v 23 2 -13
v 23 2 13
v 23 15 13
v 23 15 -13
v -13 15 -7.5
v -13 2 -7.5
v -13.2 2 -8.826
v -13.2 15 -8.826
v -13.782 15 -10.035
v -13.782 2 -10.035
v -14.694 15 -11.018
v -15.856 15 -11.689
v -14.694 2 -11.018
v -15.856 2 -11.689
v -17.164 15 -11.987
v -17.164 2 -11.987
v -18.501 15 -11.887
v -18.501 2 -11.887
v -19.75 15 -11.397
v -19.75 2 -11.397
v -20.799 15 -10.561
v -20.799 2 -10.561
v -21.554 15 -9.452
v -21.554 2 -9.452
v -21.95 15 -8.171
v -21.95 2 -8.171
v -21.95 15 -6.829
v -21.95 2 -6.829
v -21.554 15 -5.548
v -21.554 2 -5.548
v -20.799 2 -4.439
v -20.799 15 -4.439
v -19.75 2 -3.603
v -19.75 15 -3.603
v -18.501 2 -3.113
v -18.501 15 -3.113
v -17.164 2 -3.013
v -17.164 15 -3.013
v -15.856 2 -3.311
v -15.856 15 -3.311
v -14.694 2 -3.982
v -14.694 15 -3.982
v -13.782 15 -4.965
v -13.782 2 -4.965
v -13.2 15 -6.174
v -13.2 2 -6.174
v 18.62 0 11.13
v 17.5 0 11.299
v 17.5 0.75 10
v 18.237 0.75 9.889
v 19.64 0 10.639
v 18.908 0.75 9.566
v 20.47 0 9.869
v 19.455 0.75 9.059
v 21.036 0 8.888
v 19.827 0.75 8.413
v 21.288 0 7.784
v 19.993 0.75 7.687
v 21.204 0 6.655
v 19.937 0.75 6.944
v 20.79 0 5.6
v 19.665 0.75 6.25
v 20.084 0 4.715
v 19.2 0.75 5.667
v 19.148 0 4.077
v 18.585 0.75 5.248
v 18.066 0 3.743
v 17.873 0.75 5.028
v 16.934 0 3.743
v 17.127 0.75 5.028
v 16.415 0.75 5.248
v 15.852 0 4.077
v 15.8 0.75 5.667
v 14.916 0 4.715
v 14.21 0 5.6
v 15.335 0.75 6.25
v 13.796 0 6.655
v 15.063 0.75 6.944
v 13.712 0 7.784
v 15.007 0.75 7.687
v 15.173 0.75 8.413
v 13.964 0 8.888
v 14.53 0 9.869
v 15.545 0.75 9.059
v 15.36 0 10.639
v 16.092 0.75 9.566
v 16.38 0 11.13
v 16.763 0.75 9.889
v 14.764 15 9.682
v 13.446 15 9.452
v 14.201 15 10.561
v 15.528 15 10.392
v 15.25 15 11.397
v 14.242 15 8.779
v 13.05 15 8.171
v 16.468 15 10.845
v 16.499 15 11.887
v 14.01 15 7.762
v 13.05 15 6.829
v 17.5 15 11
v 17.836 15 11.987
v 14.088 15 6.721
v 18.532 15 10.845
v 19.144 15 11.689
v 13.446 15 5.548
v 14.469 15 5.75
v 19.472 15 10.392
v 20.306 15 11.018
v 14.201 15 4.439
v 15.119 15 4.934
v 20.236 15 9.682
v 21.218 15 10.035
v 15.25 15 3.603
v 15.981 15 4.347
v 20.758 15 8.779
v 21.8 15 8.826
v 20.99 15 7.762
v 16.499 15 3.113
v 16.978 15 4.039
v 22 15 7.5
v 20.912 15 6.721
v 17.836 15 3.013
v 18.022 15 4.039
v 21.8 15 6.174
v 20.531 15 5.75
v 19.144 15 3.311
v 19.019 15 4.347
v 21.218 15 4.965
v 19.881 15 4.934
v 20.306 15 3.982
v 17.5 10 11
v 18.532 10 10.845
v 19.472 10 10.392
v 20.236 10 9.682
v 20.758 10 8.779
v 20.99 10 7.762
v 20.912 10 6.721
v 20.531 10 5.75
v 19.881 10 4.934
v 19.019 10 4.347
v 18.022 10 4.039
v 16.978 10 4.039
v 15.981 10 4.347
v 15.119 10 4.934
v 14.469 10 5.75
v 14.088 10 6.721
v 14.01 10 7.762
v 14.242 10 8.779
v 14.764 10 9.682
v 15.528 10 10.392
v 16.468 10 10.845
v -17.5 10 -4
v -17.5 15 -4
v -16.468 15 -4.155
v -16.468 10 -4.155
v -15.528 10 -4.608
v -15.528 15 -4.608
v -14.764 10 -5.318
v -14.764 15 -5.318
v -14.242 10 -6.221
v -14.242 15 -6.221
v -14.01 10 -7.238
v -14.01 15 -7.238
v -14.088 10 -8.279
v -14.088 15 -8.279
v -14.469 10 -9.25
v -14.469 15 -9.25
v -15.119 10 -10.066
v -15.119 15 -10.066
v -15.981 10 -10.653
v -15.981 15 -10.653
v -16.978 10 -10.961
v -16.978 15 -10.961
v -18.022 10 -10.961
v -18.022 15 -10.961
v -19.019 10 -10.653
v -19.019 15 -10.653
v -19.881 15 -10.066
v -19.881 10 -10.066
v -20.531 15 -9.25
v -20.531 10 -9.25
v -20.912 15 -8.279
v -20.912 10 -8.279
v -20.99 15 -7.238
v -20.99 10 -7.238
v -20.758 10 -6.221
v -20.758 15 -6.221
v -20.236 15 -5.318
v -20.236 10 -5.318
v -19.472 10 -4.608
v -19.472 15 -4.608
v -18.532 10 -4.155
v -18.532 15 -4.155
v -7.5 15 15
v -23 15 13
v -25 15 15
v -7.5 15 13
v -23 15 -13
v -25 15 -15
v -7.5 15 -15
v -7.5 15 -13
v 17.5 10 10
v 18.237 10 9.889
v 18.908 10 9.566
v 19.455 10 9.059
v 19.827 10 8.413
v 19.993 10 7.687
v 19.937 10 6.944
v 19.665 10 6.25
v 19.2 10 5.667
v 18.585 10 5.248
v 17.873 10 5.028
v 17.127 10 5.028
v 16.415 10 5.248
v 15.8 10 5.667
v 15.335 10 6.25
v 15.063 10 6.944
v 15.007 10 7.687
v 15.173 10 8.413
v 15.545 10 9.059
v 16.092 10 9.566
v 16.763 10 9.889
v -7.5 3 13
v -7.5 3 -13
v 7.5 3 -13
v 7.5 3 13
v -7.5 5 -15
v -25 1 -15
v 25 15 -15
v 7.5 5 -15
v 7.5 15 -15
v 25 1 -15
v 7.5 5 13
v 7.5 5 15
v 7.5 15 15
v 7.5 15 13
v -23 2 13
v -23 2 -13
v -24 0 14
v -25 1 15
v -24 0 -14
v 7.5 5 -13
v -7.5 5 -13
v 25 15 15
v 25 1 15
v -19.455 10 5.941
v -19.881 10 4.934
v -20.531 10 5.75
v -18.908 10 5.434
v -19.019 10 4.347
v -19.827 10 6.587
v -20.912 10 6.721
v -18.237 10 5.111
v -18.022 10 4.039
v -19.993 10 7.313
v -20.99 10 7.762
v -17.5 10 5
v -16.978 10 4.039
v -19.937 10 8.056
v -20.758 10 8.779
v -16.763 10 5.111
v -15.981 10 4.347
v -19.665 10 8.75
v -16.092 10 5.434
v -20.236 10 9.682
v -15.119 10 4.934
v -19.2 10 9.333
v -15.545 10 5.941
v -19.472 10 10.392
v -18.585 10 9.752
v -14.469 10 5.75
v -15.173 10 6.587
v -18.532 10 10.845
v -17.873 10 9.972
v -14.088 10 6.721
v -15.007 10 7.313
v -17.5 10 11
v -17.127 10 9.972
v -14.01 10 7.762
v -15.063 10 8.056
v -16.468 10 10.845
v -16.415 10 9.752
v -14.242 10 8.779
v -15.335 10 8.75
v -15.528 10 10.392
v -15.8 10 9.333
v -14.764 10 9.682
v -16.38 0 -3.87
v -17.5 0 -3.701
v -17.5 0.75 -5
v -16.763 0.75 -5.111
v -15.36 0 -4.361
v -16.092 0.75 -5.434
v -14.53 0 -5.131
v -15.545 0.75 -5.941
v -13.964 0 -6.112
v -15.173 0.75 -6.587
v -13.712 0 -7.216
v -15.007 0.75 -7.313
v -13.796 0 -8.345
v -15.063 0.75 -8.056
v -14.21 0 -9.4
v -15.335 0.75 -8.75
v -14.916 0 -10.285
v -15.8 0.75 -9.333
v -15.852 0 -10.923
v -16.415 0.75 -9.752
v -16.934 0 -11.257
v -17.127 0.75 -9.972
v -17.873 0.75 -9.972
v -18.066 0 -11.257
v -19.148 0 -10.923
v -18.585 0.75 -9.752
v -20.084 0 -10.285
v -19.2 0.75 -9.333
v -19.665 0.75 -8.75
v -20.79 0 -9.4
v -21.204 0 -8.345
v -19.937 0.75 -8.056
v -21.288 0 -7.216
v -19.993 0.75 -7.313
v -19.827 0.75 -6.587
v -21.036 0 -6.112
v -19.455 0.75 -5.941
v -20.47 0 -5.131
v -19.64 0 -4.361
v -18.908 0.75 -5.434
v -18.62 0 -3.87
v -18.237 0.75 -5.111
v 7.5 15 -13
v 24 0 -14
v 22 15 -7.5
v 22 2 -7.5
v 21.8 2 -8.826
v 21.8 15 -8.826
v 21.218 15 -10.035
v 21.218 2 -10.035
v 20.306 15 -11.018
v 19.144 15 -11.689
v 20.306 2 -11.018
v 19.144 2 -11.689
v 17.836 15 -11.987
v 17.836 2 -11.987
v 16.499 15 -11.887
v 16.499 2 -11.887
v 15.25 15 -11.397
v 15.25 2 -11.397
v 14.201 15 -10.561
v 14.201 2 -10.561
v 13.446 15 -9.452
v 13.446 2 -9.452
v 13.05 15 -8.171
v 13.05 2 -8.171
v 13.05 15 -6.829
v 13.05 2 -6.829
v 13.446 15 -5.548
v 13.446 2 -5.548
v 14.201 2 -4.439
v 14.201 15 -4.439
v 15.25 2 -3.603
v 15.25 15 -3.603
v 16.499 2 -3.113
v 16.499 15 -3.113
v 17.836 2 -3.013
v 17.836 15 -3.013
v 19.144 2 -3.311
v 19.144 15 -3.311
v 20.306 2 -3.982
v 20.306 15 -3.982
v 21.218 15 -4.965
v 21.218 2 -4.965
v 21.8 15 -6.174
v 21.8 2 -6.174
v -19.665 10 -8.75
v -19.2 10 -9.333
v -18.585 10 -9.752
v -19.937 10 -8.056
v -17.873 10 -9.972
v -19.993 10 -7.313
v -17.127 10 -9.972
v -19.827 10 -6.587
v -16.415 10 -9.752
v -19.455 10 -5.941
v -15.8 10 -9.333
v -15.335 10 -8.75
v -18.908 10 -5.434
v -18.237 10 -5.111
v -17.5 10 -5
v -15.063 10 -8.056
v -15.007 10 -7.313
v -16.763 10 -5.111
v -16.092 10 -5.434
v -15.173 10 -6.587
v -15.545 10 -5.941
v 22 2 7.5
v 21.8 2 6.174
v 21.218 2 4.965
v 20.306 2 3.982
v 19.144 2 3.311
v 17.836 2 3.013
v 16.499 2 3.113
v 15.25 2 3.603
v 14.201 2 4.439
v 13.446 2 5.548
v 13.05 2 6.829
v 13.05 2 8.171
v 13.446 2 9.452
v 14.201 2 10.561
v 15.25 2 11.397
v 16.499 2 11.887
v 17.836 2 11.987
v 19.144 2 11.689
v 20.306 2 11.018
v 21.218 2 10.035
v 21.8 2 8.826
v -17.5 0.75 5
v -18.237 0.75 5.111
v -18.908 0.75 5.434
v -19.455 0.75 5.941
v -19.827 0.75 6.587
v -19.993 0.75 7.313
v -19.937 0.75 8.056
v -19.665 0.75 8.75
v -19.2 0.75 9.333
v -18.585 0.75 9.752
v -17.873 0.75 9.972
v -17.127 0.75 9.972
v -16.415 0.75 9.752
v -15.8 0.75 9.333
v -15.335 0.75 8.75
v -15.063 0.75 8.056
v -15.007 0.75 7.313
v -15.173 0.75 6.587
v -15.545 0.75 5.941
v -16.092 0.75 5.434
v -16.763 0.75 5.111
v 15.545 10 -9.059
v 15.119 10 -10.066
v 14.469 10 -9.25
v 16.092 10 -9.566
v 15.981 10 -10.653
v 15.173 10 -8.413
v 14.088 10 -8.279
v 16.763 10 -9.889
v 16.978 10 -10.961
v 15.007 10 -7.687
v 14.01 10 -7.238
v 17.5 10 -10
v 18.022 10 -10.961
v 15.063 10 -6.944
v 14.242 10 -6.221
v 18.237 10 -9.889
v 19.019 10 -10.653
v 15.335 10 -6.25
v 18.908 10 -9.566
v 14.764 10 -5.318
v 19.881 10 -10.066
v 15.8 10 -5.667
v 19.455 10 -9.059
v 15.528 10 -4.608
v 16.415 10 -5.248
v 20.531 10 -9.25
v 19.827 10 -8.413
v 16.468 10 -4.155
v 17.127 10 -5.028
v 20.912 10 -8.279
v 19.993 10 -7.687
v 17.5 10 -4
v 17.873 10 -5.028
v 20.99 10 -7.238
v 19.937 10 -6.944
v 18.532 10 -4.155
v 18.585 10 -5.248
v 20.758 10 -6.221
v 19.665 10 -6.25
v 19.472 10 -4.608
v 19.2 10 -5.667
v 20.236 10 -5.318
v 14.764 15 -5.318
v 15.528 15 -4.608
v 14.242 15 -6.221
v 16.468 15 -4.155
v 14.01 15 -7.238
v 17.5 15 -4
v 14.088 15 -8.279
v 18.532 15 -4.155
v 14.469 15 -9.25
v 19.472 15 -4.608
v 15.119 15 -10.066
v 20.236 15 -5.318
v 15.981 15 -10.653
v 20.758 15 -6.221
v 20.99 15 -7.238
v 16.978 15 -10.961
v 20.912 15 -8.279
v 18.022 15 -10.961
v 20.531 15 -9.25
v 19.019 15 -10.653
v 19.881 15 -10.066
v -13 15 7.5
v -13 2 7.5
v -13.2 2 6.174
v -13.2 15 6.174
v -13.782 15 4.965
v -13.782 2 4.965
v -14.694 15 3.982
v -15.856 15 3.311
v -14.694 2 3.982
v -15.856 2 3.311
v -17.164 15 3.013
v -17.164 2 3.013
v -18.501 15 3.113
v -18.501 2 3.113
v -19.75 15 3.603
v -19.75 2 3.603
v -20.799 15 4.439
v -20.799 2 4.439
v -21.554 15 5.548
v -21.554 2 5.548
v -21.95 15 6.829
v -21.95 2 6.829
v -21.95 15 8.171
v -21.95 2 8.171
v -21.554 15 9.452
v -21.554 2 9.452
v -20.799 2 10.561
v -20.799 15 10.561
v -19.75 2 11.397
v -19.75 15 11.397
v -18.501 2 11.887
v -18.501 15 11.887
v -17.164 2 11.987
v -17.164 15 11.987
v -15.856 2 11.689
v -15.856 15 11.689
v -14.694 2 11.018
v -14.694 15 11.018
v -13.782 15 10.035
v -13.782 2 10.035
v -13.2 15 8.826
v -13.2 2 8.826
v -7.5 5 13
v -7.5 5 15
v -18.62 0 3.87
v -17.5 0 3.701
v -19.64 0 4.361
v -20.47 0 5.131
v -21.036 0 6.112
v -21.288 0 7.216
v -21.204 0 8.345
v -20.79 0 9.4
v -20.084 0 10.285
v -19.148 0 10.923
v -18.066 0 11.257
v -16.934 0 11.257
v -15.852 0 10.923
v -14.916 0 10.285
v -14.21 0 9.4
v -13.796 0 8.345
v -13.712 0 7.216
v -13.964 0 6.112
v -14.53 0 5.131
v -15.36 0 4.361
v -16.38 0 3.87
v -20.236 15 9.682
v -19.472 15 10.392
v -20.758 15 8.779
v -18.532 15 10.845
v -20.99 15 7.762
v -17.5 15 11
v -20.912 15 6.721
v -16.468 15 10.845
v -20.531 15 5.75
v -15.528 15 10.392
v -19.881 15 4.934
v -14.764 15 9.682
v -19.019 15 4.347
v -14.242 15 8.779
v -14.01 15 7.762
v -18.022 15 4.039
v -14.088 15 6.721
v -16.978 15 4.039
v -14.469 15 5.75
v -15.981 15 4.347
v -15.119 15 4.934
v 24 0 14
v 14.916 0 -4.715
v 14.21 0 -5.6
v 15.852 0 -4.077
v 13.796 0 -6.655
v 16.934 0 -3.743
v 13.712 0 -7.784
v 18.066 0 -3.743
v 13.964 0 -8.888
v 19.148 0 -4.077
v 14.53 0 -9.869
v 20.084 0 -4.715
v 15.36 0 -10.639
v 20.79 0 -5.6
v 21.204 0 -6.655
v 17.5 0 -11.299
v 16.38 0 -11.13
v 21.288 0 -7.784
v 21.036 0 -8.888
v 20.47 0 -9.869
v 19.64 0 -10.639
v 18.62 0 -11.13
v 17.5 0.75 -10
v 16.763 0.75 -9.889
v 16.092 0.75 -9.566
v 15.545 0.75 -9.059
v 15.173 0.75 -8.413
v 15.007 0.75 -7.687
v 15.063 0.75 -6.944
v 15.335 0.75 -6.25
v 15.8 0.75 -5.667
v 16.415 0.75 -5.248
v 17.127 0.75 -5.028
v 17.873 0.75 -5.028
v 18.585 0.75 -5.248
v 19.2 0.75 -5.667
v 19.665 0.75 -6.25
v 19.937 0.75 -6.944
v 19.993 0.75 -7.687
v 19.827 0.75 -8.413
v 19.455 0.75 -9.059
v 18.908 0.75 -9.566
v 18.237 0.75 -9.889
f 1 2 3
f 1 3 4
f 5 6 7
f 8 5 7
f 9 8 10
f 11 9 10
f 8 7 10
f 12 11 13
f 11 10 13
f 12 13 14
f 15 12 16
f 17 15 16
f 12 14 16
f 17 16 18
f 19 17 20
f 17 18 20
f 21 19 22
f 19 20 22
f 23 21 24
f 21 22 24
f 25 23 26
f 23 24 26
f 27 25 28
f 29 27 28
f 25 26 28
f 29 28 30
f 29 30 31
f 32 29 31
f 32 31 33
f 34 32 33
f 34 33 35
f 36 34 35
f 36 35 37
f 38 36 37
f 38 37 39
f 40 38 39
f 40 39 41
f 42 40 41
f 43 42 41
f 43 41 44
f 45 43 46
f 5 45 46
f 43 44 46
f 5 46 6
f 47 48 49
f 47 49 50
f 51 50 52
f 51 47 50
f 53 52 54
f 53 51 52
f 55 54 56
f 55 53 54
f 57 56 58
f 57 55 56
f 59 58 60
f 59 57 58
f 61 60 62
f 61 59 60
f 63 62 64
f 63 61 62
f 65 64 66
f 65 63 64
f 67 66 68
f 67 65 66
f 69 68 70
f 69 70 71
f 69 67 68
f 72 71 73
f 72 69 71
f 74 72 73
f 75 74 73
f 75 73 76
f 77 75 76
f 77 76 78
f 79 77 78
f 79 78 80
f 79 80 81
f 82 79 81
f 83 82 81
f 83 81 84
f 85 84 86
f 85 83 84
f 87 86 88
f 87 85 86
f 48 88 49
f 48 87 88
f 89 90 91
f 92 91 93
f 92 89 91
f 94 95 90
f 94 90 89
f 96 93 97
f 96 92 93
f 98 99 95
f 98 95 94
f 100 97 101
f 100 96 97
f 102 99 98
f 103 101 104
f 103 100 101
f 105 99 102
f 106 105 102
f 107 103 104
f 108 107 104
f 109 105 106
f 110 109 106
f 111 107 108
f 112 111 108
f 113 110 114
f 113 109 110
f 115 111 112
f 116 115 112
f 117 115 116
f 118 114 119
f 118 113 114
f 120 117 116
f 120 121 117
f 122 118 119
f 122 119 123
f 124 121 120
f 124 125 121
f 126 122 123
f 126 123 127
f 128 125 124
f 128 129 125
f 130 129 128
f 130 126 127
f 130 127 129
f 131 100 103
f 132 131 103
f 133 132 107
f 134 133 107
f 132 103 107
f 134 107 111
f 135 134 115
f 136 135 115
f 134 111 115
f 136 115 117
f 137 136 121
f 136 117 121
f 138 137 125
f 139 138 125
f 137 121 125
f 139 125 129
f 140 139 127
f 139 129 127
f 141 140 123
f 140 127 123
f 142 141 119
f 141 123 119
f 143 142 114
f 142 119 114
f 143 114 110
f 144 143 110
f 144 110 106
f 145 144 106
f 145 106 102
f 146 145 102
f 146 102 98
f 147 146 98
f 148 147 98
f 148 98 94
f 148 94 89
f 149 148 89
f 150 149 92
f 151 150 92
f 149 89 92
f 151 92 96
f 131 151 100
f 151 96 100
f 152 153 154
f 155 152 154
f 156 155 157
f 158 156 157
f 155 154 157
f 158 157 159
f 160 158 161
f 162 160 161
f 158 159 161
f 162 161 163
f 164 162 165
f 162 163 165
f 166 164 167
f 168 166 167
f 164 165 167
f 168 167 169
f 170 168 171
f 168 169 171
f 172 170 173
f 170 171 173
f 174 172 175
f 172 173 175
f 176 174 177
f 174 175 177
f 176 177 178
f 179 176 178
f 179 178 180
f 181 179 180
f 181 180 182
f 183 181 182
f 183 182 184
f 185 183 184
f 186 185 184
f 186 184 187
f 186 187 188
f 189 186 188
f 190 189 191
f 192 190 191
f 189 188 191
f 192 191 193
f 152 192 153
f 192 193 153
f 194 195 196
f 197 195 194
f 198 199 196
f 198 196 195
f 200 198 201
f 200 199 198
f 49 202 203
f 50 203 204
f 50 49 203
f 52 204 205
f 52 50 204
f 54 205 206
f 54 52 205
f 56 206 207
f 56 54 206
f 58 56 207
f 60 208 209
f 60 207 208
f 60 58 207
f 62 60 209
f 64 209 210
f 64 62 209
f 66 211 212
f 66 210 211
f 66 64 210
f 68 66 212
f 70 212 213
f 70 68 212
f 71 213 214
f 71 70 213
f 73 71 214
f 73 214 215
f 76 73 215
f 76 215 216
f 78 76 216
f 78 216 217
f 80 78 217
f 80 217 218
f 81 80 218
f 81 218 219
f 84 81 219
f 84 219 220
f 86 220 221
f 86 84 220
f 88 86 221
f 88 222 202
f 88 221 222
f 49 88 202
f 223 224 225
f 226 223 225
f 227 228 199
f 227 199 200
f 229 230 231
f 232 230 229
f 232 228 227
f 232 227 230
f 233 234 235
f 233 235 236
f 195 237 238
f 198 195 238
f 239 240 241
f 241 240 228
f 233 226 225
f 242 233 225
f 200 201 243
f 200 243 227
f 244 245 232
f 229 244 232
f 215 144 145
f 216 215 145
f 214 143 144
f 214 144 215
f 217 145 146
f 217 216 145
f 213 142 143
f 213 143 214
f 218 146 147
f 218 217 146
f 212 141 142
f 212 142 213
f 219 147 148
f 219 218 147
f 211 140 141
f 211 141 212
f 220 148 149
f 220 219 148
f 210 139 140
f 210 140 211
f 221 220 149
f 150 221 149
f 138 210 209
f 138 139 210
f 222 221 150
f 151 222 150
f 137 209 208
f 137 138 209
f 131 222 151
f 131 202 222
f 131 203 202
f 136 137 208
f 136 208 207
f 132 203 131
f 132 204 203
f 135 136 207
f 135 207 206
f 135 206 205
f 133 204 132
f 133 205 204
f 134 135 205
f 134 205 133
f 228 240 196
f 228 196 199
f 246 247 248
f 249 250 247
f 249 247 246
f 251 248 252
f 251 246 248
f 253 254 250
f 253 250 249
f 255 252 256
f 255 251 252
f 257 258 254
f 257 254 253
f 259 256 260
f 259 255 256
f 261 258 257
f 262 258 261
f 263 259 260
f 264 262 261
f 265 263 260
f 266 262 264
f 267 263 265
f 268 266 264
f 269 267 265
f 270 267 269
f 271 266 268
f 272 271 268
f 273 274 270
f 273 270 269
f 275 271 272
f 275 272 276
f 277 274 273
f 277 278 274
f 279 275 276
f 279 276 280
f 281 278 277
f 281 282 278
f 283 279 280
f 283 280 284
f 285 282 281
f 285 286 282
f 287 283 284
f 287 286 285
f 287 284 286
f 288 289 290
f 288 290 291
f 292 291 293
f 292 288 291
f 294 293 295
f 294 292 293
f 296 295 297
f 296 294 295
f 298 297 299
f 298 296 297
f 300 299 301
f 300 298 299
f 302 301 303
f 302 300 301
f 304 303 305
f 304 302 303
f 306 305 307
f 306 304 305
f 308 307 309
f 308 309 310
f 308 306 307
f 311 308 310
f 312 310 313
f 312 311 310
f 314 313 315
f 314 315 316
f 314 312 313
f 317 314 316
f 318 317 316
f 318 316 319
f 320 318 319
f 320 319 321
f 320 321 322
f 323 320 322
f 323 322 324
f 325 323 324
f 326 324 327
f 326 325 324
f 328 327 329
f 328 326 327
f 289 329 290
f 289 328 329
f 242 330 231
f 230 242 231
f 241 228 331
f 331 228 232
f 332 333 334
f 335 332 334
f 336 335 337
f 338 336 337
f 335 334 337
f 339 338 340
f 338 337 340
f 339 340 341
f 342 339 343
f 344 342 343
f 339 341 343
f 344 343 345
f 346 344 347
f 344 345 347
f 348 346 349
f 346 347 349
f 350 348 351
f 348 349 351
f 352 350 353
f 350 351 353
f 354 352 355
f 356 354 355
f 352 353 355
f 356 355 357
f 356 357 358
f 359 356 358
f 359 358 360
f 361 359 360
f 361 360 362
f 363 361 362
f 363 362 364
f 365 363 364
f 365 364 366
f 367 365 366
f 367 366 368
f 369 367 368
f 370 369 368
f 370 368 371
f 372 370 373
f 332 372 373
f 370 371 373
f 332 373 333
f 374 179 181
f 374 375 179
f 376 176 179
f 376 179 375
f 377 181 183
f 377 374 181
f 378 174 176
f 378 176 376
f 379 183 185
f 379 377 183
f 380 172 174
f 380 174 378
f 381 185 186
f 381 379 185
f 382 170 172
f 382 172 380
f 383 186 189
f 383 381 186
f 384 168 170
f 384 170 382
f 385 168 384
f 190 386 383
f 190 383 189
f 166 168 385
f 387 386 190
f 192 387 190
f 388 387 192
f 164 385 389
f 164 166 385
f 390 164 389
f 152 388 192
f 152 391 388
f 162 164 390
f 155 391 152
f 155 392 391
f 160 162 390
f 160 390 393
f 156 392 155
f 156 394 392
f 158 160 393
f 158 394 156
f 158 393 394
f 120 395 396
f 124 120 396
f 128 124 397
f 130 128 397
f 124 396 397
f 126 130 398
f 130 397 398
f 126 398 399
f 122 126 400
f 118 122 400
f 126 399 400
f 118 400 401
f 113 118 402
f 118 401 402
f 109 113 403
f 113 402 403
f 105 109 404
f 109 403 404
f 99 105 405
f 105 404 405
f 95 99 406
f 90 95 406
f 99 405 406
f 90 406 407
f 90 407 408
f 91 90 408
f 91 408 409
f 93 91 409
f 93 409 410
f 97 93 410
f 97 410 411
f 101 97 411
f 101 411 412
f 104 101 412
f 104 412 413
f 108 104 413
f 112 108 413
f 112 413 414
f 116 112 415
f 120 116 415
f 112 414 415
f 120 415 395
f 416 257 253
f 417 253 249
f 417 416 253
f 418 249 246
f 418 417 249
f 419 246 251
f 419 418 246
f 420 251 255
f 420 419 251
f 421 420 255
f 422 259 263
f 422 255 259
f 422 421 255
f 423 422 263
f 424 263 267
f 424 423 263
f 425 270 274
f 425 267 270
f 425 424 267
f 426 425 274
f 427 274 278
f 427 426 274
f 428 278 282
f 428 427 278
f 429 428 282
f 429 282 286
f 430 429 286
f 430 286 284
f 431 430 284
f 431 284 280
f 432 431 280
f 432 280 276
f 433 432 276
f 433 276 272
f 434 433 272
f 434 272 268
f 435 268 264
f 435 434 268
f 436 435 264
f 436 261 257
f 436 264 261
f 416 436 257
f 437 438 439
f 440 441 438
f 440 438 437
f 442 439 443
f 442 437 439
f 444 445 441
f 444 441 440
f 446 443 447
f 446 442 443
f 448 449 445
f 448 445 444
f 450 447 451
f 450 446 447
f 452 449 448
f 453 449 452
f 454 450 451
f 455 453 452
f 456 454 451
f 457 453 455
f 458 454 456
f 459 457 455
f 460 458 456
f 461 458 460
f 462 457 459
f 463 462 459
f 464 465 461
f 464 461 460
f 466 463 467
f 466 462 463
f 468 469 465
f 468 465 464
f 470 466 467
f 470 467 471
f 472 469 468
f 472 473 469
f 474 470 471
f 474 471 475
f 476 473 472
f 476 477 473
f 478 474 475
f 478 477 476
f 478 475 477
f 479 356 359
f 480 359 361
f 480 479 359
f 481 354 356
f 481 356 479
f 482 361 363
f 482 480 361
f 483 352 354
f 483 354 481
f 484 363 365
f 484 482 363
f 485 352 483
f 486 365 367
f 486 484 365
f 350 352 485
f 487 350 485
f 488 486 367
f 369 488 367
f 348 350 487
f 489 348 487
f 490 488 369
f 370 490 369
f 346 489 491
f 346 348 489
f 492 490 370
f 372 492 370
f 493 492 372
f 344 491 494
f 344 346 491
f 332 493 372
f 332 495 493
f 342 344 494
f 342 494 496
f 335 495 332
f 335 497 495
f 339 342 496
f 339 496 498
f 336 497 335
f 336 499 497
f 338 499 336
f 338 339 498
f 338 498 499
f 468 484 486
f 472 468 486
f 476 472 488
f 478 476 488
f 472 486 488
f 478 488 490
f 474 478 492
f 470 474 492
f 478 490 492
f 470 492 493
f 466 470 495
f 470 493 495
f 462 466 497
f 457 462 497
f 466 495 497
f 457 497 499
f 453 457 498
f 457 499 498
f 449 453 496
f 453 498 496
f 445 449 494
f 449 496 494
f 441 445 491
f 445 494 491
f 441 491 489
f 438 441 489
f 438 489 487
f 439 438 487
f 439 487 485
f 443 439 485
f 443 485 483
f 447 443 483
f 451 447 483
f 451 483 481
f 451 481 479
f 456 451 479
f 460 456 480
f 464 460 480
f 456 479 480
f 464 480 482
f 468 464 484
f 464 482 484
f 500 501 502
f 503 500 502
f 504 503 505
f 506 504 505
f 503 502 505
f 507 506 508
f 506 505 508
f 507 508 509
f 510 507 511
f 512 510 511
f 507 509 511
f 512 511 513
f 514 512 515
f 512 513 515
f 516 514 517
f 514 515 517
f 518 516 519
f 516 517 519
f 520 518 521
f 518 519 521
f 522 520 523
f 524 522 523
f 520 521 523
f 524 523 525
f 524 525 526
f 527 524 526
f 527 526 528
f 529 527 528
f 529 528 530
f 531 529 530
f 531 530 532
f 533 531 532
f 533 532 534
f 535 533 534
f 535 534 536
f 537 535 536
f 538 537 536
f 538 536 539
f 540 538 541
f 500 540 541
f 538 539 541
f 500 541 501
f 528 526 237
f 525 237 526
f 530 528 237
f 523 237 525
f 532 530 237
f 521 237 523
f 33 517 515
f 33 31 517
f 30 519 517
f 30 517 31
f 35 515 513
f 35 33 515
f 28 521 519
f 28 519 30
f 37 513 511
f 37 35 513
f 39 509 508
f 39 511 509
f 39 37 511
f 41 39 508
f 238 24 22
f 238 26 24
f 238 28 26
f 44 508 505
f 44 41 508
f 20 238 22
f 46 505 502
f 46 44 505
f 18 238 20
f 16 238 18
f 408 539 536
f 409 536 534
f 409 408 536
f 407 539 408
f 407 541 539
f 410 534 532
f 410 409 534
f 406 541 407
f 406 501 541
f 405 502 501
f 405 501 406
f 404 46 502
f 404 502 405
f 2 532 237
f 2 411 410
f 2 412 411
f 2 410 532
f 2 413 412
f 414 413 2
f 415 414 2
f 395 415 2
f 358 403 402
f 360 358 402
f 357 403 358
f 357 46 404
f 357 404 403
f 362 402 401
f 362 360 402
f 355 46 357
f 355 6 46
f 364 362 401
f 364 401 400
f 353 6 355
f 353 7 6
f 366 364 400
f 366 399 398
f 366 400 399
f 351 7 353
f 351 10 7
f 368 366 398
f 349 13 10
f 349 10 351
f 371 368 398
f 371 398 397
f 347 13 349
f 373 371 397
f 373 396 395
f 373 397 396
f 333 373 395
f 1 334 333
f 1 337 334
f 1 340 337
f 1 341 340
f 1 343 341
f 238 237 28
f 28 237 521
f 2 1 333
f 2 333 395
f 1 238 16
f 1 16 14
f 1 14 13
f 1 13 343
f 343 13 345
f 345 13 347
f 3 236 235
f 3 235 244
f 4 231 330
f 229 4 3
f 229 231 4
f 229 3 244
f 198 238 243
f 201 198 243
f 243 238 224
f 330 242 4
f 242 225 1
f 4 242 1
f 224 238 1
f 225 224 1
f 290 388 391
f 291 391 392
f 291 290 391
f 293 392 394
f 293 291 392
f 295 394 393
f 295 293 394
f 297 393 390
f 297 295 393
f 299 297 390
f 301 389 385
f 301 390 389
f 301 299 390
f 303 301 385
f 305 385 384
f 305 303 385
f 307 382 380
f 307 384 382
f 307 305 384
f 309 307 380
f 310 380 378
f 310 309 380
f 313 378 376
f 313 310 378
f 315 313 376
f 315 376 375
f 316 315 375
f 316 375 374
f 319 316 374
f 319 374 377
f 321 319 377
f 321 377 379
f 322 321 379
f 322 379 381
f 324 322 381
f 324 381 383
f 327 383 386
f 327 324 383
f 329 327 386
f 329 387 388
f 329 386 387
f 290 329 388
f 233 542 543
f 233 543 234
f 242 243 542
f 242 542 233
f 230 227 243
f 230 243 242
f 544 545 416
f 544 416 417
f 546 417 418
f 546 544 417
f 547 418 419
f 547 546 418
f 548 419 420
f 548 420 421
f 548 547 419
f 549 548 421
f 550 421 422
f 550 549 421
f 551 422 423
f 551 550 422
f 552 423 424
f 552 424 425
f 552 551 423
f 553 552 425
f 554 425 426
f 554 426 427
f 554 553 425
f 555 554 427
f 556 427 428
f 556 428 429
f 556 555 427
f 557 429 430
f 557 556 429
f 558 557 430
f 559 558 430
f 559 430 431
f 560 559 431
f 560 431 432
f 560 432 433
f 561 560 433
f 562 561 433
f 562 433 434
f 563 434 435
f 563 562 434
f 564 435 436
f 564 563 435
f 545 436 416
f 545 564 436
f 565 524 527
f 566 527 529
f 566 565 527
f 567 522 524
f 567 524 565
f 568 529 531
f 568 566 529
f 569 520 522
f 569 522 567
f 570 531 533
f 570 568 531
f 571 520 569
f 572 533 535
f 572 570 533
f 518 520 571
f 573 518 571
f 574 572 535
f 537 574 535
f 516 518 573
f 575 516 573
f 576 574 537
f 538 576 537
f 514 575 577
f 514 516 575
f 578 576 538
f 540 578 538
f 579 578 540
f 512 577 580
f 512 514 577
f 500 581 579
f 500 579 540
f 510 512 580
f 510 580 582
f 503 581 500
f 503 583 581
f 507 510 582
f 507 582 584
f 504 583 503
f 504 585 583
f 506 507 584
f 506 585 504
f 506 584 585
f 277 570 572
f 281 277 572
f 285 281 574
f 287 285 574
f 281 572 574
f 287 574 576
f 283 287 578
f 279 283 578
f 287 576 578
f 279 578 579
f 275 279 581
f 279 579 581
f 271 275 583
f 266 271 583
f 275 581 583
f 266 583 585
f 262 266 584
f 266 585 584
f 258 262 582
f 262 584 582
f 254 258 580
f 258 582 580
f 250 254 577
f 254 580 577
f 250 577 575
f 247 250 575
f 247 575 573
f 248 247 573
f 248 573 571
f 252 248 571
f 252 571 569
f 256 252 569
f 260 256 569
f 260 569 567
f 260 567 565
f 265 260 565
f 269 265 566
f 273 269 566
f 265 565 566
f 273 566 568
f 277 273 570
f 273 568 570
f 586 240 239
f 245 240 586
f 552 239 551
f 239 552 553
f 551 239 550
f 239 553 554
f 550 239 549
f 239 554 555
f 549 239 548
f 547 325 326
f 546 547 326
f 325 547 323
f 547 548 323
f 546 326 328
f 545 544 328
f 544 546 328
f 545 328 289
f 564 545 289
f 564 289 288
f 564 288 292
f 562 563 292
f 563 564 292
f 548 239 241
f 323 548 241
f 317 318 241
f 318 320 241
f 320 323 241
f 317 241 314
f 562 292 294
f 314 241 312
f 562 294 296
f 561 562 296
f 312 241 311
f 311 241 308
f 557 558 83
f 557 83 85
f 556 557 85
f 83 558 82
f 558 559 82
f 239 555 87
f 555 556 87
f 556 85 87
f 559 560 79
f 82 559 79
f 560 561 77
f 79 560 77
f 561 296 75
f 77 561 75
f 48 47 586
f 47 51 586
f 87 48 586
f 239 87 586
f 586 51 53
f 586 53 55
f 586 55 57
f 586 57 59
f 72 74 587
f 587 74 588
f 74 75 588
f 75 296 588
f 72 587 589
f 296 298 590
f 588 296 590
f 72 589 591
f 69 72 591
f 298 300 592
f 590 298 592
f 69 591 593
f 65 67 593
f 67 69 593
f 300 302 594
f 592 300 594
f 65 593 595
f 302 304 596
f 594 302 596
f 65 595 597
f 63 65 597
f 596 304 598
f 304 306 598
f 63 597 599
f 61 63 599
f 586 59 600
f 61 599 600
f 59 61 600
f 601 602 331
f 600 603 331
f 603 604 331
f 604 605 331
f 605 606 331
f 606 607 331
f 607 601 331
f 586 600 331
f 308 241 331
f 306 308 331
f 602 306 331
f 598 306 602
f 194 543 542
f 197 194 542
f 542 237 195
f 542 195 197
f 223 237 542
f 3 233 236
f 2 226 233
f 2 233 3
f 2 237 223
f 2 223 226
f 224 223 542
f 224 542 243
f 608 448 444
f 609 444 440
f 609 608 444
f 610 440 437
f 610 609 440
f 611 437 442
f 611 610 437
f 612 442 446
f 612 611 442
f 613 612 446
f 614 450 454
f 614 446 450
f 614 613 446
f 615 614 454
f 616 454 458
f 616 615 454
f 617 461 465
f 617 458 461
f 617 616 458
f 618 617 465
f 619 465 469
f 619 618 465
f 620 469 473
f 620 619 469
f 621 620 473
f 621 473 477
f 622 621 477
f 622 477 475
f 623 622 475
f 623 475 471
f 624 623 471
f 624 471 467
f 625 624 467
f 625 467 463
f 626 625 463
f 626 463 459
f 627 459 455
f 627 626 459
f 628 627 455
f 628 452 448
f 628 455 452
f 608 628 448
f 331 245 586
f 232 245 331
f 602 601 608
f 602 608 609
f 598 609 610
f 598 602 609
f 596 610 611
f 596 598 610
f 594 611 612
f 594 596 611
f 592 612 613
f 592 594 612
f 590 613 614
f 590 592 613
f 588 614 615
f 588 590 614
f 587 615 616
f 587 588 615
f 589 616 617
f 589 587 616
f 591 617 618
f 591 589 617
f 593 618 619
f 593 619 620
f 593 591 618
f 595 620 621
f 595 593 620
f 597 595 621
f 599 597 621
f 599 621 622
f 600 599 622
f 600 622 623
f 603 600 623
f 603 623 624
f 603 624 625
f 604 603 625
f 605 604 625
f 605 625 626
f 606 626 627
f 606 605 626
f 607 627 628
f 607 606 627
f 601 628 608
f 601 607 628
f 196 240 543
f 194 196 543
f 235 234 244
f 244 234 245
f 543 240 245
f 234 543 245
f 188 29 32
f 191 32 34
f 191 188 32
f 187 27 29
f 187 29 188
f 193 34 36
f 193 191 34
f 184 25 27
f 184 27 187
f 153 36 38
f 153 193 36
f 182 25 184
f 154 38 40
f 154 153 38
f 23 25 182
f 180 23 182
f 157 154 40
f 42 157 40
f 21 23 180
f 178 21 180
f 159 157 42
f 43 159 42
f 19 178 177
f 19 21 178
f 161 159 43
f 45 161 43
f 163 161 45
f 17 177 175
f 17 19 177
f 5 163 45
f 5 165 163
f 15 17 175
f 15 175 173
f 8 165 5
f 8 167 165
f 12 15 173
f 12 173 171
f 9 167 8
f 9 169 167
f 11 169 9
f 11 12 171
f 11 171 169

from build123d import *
from OCP.BRepFilletAPI import BRepFilletAPI_MakeChamfer

# Parameters (mm, degrees)
SKETCH1_W           = 50
SKETCH1_H           = 30
SKETCH1_R           = 2.5
BOSS_EXTRUDE1_DEPTH = 15
SKETCH2_W           = 15
SKETCH2_H           = 30
CUT_EXTRUDE1_DEPTH  = 10
CHAMFER1_SIZE       = 0.75
CHAMFER1_SIZE2      = 1.299038106
SHELL1_START        = 2
SHELL1_OUTLINE_W    = 15.5
SHELL1_OUTLINE_H    = 26
SHELL1_OUTLINE_R    = 4.5
SHELL1_DEPTH        = 13
SHELL1_2_OUTLINE_W  = 15
SHELL1_2_OUTLINE_H  = 26
SHELL1_2_DEPTH      = 1
SKETCH3_R           = 3.5
CUT_EXTRUDE2_DEPTH  = 5
SKETCH4_R           = 3.5
CUT_EXTRUDE3_DEPTH  = 5
SKETCH5_R           = 3.5
CUT_EXTRUDE4_DEPTH  = 5
SKETCH6_R           = 3.5
CUT_EXTRUDE5_DEPTH  = 5
CHAMFER2_SIZE       = 1


# Read off the part's stored shape, not the designer's step: Shell1
with BuildPart() as part:
    # Sketch1 → Boss-Extrude1 (new body)
    with BuildSketch(Plane(origin=(0, 0, 0), x_dir=(1, 0, 0), z_dir=(0, 1, 0))):
        Rectangle(SKETCH1_W, SKETCH1_H)
        with Locations(Location((-17.5, 7.5, 0), (0, 0, 270))):
            Circle(SKETCH1_R, mode=Mode.SUBTRACT)
        with Locations(Location((17.5, 7.5, 0), (0, 0, 90))):
            Circle(SKETCH1_R, mode=Mode.SUBTRACT)
        with Locations(Location((17.5, -7.5, 0), (0, 0, 270))):
            Circle(SKETCH1_R, mode=Mode.SUBTRACT)
        with Locations(Location((-17.5, -7.5, 0), (0, 0, 90))):
            Circle(SKETCH1_R, mode=Mode.SUBTRACT)
    extrude(amount=BOSS_EXTRUDE1_DEPTH)

    # Sketch2 → Cut-Extrude1 (cut)
    with BuildSketch(Plane(origin=(0, 15, 0), x_dir=(1, 0, 0), z_dir=(0, 1, 0))):
        Rectangle(SKETCH2_W, SKETCH2_H)
    extrude(amount=-CUT_EXTRUDE1_DEPTH, mode=Mode.SUBTRACT)

    # Chamfer1: one chamfer whose edges measure the first distance from different faces: ONE call of the kernel's chamfer builder (chamfer() names one face for all edges)
    chamfer1_edges_1 = [part.edges().sort_by_distance(p)[0] for p in [
        (-17.5, 0, -10),
    ]]
    chamfer1_side_1 = [part.faces().sort_by_distance(p)[0] for p in [
        (-17.5, 7.5, -10),
    ]]
    chamfer1_edges_2 = [part.edges().sort_by_distance(p)[0] for p in [
        (17.5, 0, -5),
    ]]
    chamfer1_side_2 = [part.faces().sort_by_distance(p)[0] for p in [
        (17.5, 7.5, -5),
    ]]
    chamfer1_edges_3 = [part.edges().sort_by_distance(p)[0] for p in [
        (17.5, 0, 5),
    ]]
    chamfer1_side_3 = [part.faces().sort_by_distance(p)[0] for p in [
        (17.5, 7.5, 5),
    ]]
    chamfer1_edges_4 = [part.edges().sort_by_distance(p)[0] for p in [
        (-17.5, 0, 10),
    ]]
    chamfer1_side_4 = [part.faces().sort_by_distance(p)[0] for p in [
        (-17.5, 7.5, 10),
    ]]
    chamfer1 = BRepFilletAPI_MakeChamfer(part.part.solid().wrapped)
    for e in chamfer1_edges_1:
        chamfer1.Add(CHAMFER1_SIZE, CHAMFER1_SIZE2, e.wrapped, chamfer1_side_1[0].wrapped)  # the first distance lies on this face
    for e in chamfer1_edges_2:
        chamfer1.Add(CHAMFER1_SIZE, CHAMFER1_SIZE2, e.wrapped, chamfer1_side_2[0].wrapped)  # the first distance lies on this face
    for e in chamfer1_edges_3:
        chamfer1.Add(CHAMFER1_SIZE, CHAMFER1_SIZE2, e.wrapped, chamfer1_side_3[0].wrapped)  # the first distance lies on this face
    for e in chamfer1_edges_4:
        chamfer1.Add(CHAMFER1_SIZE, CHAMFER1_SIZE2, e.wrapped, chamfer1_side_4[0].wrapped)  # the first distance lies on this face
    add(Compound.cast(chamfer1.Shape()), mode=Mode.REPLACE)

    # Shell1 outline → Shell1 (cut)
    # profile 1 of 2: a face of its own
    with BuildSketch(Plane(origin=(0, 0, 0), x_dir=(1, 0, 0), z_dir=(0, 1, 0)).offset(SHELL1_START)):
        with Locations((-15.25, 0)):
            Rectangle(SHELL1_OUTLINE_W, SHELL1_OUTLINE_H)
        with Locations((-17.5, -7.5)):
            Circle(SHELL1_OUTLINE_R, mode=Mode.SUBTRACT)
        with Locations((-17.5, 7.5)):
            Circle(SHELL1_OUTLINE_R, mode=Mode.SUBTRACT)
    # profile 2 of 2: a face of its own
    with BuildSketch(Plane(origin=(0, 0, 0), x_dir=(1, 0, 0), z_dir=(0, 1, 0)).offset(SHELL1_START)):
        with Locations((15.25, 0)):
            Rectangle(SHELL1_OUTLINE_W, SHELL1_OUTLINE_H)
        with Locations((17.5, -7.5)):
            Circle(SHELL1_OUTLINE_R, mode=Mode.SUBTRACT)
        with Locations((17.5, 7.5)):
            Circle(SHELL1_OUTLINE_R, mode=Mode.SUBTRACT)
    extrude(amount=SHELL1_DEPTH, mode=Mode.SUBTRACT)

    # Shell1 2 outline → Shell1 2 (cut)
    with BuildSketch(Plane(origin=(0, 0, 0), x_dir=(1, 0, 0), z_dir=(0, 1, 0)).offset(SHELL1_START)):
        Rectangle(SHELL1_2_OUTLINE_W, SHELL1_2_OUTLINE_H)
    extrude(amount=SHELL1_2_DEPTH, mode=Mode.SUBTRACT)

    # Sketch3 → Cut-Extrude2 (cut)
    with BuildSketch(Plane(origin=(0, 15, 0), x_dir=(1, 0, 0), z_dir=(0, 1, 0))):
        with Locations(Location((-17.5, -7.5, 0), (0, 0, 270))):
            Circle(SKETCH3_R)
    extrude(amount=-CUT_EXTRUDE2_DEPTH, mode=Mode.SUBTRACT)

    # Sketch4 → Cut-Extrude3 (cut)
    with BuildSketch(Plane(origin=(0, 15, 0), x_dir=(1, 0, 0), z_dir=(0, 1, 0))):
        with Locations(Location((-17.5, 7.5, 0), (0, 0, 270))):
            Circle(SKETCH4_R)
    extrude(amount=-CUT_EXTRUDE3_DEPTH, mode=Mode.SUBTRACT)

    # Sketch5 → Cut-Extrude4 (cut)
    with BuildSketch(Plane(origin=(0, 15, 0), x_dir=(1, 0, 0), z_dir=(0, 1, 0))):
        with Locations(Location((17.5, 7.5, 0), (0, 0, 270))):
            Circle(SKETCH5_R)
    extrude(amount=-CUT_EXTRUDE4_DEPTH, mode=Mode.SUBTRACT)

    # Sketch6 → Cut-Extrude5 (cut)
    with BuildSketch(Plane(origin=(0, 15, 0), x_dir=(1, 0, 0), z_dir=(0, 1, 0))):
        with Locations(Location((17.5, -7.5, 0), (0, 0, 270))):
            Circle(SKETCH6_R)
    extrude(amount=-CUT_EXTRUDE5_DEPTH, mode=Mode.SUBTRACT)

    # Chamfer2
    chamfer2_edges = [part.edges().sort_by_distance(p)[0] for p in [
        (0, 0, -15),
        (25, 0, 0),
        (0, 0, 15),
        (-25, 0, 0),
    ]]
    chamfer(chamfer2_edges, length=CHAMFER2_SIZE)


solid = part.part
